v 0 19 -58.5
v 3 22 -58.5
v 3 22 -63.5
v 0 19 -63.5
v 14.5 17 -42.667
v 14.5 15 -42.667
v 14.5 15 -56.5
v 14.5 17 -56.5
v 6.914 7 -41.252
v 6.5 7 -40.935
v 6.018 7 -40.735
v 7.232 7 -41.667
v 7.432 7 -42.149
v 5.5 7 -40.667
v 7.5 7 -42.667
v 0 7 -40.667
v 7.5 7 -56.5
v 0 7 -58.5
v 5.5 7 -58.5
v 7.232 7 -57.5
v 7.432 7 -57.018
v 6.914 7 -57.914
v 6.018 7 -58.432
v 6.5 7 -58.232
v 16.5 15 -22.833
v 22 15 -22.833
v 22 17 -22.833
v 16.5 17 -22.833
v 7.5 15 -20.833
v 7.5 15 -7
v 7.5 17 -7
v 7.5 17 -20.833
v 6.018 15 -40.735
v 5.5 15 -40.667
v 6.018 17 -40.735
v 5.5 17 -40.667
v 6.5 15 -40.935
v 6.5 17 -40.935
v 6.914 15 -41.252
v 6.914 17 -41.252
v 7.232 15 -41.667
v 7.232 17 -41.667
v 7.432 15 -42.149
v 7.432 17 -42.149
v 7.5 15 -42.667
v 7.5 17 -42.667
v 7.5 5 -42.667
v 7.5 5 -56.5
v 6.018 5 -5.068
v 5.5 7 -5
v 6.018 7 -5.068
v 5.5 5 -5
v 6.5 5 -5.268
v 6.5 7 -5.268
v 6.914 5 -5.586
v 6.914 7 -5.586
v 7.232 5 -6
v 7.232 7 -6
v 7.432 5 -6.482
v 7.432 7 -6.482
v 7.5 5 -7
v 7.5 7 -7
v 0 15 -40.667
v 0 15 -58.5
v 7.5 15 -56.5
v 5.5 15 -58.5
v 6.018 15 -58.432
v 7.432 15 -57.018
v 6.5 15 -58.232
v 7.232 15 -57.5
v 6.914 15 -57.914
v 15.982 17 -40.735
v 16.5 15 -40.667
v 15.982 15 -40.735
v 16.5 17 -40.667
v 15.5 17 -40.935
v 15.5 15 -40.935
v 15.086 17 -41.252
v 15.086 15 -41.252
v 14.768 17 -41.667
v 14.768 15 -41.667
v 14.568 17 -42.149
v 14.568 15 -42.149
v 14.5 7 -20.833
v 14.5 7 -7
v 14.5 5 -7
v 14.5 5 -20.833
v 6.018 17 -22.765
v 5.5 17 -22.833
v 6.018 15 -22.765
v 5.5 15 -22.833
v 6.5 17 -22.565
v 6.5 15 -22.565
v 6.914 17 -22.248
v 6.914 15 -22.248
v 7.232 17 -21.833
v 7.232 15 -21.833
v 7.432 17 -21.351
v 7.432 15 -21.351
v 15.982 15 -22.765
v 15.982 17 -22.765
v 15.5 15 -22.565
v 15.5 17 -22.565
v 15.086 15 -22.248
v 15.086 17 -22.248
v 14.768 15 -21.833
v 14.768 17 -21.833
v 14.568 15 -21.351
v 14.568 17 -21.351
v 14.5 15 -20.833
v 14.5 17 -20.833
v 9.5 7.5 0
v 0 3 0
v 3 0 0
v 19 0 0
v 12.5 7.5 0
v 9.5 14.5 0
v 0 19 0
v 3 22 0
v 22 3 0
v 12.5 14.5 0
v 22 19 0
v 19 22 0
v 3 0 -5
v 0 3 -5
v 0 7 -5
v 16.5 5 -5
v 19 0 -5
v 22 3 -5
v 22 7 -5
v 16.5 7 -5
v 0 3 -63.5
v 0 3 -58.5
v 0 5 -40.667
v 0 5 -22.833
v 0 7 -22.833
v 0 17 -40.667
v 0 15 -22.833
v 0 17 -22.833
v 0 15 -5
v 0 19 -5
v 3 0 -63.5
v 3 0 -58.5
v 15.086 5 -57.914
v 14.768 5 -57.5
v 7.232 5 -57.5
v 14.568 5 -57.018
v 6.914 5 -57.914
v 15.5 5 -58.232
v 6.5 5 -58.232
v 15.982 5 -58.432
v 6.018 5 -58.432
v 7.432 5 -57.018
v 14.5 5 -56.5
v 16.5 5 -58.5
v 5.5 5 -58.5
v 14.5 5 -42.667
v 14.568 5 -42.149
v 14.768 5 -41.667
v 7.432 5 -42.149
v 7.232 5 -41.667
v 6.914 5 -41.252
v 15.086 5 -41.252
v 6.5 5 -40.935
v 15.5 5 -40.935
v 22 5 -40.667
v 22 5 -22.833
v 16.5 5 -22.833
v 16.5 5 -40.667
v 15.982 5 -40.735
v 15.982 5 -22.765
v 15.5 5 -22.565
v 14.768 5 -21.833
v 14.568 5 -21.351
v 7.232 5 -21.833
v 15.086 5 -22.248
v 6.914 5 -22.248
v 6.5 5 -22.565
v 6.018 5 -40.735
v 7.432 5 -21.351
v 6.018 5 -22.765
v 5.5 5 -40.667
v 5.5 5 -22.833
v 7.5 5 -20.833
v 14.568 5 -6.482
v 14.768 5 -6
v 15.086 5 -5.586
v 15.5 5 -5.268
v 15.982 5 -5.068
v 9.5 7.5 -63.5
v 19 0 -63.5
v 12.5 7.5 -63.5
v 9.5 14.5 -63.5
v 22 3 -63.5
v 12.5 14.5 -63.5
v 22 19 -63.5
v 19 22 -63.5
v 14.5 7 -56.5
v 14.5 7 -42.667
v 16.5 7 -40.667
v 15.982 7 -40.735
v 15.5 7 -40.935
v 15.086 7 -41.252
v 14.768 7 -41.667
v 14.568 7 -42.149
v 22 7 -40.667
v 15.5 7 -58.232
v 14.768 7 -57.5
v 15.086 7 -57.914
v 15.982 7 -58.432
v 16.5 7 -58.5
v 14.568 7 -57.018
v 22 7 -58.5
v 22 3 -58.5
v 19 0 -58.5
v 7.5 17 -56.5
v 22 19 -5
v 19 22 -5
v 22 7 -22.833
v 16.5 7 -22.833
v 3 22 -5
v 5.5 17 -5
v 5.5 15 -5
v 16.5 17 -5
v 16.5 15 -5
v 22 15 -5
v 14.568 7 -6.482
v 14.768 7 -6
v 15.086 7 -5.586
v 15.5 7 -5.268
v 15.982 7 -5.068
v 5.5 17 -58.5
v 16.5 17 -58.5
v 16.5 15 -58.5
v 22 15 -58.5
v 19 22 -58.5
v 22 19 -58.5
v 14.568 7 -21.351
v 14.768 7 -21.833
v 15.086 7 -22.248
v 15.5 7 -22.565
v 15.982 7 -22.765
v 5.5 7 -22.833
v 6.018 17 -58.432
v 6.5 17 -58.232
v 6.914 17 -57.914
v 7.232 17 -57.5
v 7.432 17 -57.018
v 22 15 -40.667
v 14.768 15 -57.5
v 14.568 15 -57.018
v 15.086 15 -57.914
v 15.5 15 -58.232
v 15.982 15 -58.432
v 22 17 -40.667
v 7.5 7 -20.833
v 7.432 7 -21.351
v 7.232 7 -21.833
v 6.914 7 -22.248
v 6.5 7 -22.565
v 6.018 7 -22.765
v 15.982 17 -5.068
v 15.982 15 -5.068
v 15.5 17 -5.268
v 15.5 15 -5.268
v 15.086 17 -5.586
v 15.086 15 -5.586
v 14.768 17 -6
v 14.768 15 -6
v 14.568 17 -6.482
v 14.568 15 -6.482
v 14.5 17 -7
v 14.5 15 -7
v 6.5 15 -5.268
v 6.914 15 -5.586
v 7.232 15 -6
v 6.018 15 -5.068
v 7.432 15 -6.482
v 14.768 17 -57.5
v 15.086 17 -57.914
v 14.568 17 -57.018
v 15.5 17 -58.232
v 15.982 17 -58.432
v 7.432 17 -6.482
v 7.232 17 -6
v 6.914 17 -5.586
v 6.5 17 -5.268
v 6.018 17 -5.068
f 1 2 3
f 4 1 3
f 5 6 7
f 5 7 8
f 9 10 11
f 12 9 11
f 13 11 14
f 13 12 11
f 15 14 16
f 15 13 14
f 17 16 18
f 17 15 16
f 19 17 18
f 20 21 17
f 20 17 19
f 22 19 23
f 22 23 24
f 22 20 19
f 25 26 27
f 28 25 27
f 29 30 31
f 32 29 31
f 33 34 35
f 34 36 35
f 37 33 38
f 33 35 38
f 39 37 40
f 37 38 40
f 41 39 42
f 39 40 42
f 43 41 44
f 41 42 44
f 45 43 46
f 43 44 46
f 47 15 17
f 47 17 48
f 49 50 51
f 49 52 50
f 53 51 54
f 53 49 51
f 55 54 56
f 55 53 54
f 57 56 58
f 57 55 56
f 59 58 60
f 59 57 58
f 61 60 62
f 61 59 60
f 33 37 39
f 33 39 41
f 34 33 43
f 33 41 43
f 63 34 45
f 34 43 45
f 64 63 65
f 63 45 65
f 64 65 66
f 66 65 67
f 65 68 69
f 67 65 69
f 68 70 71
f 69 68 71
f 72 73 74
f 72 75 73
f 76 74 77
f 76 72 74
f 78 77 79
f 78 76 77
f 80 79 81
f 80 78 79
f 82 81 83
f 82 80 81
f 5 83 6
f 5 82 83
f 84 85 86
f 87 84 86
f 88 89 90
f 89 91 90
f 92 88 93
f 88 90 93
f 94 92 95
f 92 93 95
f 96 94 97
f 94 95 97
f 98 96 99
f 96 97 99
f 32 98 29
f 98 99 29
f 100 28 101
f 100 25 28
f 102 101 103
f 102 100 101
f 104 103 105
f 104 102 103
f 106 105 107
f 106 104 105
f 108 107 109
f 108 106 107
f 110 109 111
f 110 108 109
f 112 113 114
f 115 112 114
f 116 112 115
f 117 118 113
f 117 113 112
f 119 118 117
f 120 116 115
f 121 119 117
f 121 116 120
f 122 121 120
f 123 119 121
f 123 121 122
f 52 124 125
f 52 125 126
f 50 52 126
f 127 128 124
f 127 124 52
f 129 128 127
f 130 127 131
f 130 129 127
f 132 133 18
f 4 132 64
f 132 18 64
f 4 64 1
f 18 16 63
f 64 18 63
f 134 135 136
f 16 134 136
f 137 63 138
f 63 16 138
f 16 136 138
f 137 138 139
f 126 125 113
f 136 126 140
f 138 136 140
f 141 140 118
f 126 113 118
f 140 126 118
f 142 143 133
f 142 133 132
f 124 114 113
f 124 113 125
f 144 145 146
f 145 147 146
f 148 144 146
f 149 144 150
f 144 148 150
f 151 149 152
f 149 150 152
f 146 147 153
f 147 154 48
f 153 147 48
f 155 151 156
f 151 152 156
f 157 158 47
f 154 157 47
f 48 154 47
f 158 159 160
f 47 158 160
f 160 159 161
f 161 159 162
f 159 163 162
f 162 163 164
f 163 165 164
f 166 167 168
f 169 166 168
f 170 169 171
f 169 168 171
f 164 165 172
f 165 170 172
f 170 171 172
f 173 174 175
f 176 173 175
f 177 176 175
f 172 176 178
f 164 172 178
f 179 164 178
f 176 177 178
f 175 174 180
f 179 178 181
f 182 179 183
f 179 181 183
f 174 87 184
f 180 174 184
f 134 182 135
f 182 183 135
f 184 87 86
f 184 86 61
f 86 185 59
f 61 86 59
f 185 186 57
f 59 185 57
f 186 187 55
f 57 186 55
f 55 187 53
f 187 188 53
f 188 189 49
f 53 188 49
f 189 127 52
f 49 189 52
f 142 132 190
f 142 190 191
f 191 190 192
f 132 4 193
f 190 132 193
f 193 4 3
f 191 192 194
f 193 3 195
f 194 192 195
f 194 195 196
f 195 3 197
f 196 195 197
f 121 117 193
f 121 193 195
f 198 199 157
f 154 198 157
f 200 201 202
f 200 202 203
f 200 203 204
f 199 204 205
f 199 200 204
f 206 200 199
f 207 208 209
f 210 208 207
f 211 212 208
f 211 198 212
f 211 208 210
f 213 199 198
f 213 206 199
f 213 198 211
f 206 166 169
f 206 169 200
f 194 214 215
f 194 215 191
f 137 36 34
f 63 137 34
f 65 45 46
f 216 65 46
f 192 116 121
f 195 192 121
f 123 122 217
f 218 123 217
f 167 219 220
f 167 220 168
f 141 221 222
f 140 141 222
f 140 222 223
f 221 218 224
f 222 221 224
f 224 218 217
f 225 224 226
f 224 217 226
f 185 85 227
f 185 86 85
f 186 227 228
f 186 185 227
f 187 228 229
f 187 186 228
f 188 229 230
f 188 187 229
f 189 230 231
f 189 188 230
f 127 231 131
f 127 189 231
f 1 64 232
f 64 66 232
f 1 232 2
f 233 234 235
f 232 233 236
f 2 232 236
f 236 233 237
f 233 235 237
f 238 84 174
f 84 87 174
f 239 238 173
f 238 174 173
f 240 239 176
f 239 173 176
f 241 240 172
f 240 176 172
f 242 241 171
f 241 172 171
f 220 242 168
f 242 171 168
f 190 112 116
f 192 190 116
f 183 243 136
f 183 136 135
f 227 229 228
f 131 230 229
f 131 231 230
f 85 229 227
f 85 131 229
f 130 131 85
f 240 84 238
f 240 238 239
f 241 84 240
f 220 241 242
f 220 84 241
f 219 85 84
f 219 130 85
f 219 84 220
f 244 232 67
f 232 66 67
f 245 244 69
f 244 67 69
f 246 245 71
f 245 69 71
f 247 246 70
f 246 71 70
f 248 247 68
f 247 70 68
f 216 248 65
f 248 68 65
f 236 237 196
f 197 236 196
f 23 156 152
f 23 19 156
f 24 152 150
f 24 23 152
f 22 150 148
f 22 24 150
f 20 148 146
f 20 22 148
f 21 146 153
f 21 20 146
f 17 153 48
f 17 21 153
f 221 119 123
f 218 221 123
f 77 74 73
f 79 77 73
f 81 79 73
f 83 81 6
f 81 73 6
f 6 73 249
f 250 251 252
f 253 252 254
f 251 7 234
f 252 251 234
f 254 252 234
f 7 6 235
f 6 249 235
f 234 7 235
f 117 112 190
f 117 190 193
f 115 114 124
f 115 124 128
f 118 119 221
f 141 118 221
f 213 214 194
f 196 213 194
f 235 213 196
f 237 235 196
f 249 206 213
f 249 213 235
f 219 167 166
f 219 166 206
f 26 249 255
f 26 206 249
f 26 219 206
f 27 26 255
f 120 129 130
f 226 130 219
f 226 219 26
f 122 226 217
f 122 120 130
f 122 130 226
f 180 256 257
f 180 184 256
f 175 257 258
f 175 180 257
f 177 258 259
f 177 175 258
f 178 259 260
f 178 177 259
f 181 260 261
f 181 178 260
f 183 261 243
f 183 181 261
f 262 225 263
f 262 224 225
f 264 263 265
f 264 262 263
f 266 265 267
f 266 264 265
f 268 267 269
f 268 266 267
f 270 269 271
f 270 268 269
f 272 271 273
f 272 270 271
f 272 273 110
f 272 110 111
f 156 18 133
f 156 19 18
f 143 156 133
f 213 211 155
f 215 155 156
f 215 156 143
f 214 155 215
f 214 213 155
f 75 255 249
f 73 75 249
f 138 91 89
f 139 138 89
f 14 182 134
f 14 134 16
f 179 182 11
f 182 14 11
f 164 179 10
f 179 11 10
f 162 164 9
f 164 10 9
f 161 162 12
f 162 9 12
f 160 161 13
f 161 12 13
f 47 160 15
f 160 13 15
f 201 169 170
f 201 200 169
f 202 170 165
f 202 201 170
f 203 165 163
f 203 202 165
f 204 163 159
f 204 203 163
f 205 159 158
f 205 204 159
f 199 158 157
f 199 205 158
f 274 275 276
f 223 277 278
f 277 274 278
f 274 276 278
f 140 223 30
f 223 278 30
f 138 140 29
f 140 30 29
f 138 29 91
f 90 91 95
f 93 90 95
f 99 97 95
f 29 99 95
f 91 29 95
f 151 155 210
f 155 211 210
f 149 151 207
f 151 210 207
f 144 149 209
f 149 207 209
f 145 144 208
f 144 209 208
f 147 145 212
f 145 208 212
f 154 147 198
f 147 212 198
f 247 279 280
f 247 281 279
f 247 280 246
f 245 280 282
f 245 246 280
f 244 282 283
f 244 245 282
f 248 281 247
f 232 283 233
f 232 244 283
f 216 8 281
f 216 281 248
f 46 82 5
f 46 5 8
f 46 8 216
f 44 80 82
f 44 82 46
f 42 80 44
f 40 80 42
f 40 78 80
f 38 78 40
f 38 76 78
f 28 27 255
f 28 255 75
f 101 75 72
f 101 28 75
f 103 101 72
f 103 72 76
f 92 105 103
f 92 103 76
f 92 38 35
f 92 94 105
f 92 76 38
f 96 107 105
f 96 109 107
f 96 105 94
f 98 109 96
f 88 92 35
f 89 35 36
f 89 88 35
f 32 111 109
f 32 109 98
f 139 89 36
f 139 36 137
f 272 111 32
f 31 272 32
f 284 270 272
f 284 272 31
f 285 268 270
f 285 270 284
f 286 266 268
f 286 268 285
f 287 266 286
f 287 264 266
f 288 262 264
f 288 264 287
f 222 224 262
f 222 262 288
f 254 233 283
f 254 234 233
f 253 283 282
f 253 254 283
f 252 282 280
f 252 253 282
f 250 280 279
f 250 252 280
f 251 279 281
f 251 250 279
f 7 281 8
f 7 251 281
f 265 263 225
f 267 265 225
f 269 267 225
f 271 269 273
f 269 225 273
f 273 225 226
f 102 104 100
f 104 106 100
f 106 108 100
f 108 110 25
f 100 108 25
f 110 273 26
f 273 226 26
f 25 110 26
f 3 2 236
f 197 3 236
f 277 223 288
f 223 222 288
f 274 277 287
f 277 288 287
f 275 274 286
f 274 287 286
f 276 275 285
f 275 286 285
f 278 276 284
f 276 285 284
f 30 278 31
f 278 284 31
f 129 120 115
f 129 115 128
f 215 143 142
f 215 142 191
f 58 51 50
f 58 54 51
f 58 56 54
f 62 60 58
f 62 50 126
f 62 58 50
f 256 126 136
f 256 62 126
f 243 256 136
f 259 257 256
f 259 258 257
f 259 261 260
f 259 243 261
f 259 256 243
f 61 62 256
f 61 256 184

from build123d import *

# Parameters (mm, degrees)
SKETCH1_W           = 22
SKETCH1_H           = 22
BOSS_EXTRUDE1_DEPTH = 63.5
CUT_EXTRUDE1_DEPTH  = 71.712445864
SKETCH3_W           = 3
SKETCH3_H           = 7
CUT_EXTRUDE2_DEPTH  = 71.712445864
BOSS_EXTRUDE2_REACH = 68.259
SKETCH4_W           = 7
SKETCH4_H           = 2
FILLET1_R           = 2
CHAMFER1_SIZE       = 3


with BuildPart() as part:
    # Sketch1 → Boss-Extrude1 (new body)
    with BuildSketch(Plane.XY):
        with Locations((11, 11)):
            Rectangle(SKETCH1_W, SKETCH1_H)
    extrude(amount=-BOSS_EXTRUDE1_DEPTH)

    # Sketch2 → Cut-Extrude1 (cut, through all)
    with BuildSketch(Plane(origin=(22, 0, 0), x_dir=(0, 0, -1), z_dir=(1, 0, 0))):
        Polygon((5, 22), (5, 15), (22.833333333, 15), (22.833333333, 17), (40.666666667, 17), (40.666666667, 15), (58.5, 15), (58.5, 22), align=None)
        Polygon((22.833333333, 7), (22.833333333, 5), (40.666666667, 5), (40.666666667, 7), (58.5, 7), (58.5, 0), (5, 0), (5, 7), align=None)
    extrude(amount=-CUT_EXTRUDE1_DEPTH, mode=Mode.SUBTRACT)

    # Sketch3 → Cut-Extrude2 (cut, through all)
    with BuildSketch(Plane.XY):
        with Locations((11, 11)):
            Rectangle(SKETCH3_W, SKETCH3_H)
    extrude(amount=-CUT_EXTRUDE2_DEPTH, mode=Mode.SUBTRACT)

    # Boss-Extrude2: up to this face of the body (flat: up to its plane)
    boss_extrude2_end = Plane(part.part.faces().sort_by_distance((11, 18.5, -58.5))[0])
    # Sketch4 → Boss-Extrude2 (add, up to the picked face)
    with BuildSketch(Plane(origin=(0, 0, -5), x_dir=(-1, 0, 0), z_dir=(0, 0, -1)), mode=Mode.PRIVATE) as boss_extrude2_sk1:
        with Locations((-11, 16)):
            Rectangle(SKETCH4_W, SKETCH4_H)
    boss_extrude2_tool1 = split(extrude(boss_extrude2_sk1.sketch, amount=BOSS_EXTRUDE2_REACH, mode=Mode.PRIVATE), bisect_by=boss_extrude2_end, keep=Keep.BOTH, mode=Mode.PRIVATE)
    boss_extrude2 = boss_extrude2_tool1.solids().sort_by(Axis((11, 16, -5), (0, 0, -1)))[0]
    add(boss_extrude2)

    # Mirror1: Boss-Extrude2 across plane
    add(boss_extrude2.mirror(Plane.ZX.offset(11)))

    # Fillet1
    fillet1_edges = [part.edges().sort_by_distance(p)[0] for p in [
        (7.5, 16, -40.666666667),
        (7.5, 16, -22.833333333),
        (7.5, 16, -5),
        (14.5, 16, -40.666666667),
        (14.5, 16, -22.833333333),
        (14.5, 16, -5),
        (7.5, 16, -58.5),
        (14.5, 16, -58.5),
        (14.5, 6, -58.5),
        (7.5, 6, -58.5),
        (7.5, 6, -5),
        (14.5, 6, -5),
        (14.5, 6, -22.833333333),
        (14.5, 6, -40.666666667),
        (7.5, 6, -22.833333333),
        (7.5, 6, -40.666666667),
    ]]
    fillet(fillet1_edges, radius=FILLET1_R)

    # Chamfer1
    chamfer1_edges = [part.edges().sort_by_distance(p)[0] for p in [
        (0, 0, -2.5),
        (22, 0, -2.5),
        (22, 22, -2.5),
        (0, 22, -2.5),
        (0, 22, -61),
        (22, 22, -61),
        (22, 0, -61),
        (0, 0, -61),
    ]]
    chamfer(chamfer1_edges, length=CHAMFER1_SIZE)


solid = part.part
